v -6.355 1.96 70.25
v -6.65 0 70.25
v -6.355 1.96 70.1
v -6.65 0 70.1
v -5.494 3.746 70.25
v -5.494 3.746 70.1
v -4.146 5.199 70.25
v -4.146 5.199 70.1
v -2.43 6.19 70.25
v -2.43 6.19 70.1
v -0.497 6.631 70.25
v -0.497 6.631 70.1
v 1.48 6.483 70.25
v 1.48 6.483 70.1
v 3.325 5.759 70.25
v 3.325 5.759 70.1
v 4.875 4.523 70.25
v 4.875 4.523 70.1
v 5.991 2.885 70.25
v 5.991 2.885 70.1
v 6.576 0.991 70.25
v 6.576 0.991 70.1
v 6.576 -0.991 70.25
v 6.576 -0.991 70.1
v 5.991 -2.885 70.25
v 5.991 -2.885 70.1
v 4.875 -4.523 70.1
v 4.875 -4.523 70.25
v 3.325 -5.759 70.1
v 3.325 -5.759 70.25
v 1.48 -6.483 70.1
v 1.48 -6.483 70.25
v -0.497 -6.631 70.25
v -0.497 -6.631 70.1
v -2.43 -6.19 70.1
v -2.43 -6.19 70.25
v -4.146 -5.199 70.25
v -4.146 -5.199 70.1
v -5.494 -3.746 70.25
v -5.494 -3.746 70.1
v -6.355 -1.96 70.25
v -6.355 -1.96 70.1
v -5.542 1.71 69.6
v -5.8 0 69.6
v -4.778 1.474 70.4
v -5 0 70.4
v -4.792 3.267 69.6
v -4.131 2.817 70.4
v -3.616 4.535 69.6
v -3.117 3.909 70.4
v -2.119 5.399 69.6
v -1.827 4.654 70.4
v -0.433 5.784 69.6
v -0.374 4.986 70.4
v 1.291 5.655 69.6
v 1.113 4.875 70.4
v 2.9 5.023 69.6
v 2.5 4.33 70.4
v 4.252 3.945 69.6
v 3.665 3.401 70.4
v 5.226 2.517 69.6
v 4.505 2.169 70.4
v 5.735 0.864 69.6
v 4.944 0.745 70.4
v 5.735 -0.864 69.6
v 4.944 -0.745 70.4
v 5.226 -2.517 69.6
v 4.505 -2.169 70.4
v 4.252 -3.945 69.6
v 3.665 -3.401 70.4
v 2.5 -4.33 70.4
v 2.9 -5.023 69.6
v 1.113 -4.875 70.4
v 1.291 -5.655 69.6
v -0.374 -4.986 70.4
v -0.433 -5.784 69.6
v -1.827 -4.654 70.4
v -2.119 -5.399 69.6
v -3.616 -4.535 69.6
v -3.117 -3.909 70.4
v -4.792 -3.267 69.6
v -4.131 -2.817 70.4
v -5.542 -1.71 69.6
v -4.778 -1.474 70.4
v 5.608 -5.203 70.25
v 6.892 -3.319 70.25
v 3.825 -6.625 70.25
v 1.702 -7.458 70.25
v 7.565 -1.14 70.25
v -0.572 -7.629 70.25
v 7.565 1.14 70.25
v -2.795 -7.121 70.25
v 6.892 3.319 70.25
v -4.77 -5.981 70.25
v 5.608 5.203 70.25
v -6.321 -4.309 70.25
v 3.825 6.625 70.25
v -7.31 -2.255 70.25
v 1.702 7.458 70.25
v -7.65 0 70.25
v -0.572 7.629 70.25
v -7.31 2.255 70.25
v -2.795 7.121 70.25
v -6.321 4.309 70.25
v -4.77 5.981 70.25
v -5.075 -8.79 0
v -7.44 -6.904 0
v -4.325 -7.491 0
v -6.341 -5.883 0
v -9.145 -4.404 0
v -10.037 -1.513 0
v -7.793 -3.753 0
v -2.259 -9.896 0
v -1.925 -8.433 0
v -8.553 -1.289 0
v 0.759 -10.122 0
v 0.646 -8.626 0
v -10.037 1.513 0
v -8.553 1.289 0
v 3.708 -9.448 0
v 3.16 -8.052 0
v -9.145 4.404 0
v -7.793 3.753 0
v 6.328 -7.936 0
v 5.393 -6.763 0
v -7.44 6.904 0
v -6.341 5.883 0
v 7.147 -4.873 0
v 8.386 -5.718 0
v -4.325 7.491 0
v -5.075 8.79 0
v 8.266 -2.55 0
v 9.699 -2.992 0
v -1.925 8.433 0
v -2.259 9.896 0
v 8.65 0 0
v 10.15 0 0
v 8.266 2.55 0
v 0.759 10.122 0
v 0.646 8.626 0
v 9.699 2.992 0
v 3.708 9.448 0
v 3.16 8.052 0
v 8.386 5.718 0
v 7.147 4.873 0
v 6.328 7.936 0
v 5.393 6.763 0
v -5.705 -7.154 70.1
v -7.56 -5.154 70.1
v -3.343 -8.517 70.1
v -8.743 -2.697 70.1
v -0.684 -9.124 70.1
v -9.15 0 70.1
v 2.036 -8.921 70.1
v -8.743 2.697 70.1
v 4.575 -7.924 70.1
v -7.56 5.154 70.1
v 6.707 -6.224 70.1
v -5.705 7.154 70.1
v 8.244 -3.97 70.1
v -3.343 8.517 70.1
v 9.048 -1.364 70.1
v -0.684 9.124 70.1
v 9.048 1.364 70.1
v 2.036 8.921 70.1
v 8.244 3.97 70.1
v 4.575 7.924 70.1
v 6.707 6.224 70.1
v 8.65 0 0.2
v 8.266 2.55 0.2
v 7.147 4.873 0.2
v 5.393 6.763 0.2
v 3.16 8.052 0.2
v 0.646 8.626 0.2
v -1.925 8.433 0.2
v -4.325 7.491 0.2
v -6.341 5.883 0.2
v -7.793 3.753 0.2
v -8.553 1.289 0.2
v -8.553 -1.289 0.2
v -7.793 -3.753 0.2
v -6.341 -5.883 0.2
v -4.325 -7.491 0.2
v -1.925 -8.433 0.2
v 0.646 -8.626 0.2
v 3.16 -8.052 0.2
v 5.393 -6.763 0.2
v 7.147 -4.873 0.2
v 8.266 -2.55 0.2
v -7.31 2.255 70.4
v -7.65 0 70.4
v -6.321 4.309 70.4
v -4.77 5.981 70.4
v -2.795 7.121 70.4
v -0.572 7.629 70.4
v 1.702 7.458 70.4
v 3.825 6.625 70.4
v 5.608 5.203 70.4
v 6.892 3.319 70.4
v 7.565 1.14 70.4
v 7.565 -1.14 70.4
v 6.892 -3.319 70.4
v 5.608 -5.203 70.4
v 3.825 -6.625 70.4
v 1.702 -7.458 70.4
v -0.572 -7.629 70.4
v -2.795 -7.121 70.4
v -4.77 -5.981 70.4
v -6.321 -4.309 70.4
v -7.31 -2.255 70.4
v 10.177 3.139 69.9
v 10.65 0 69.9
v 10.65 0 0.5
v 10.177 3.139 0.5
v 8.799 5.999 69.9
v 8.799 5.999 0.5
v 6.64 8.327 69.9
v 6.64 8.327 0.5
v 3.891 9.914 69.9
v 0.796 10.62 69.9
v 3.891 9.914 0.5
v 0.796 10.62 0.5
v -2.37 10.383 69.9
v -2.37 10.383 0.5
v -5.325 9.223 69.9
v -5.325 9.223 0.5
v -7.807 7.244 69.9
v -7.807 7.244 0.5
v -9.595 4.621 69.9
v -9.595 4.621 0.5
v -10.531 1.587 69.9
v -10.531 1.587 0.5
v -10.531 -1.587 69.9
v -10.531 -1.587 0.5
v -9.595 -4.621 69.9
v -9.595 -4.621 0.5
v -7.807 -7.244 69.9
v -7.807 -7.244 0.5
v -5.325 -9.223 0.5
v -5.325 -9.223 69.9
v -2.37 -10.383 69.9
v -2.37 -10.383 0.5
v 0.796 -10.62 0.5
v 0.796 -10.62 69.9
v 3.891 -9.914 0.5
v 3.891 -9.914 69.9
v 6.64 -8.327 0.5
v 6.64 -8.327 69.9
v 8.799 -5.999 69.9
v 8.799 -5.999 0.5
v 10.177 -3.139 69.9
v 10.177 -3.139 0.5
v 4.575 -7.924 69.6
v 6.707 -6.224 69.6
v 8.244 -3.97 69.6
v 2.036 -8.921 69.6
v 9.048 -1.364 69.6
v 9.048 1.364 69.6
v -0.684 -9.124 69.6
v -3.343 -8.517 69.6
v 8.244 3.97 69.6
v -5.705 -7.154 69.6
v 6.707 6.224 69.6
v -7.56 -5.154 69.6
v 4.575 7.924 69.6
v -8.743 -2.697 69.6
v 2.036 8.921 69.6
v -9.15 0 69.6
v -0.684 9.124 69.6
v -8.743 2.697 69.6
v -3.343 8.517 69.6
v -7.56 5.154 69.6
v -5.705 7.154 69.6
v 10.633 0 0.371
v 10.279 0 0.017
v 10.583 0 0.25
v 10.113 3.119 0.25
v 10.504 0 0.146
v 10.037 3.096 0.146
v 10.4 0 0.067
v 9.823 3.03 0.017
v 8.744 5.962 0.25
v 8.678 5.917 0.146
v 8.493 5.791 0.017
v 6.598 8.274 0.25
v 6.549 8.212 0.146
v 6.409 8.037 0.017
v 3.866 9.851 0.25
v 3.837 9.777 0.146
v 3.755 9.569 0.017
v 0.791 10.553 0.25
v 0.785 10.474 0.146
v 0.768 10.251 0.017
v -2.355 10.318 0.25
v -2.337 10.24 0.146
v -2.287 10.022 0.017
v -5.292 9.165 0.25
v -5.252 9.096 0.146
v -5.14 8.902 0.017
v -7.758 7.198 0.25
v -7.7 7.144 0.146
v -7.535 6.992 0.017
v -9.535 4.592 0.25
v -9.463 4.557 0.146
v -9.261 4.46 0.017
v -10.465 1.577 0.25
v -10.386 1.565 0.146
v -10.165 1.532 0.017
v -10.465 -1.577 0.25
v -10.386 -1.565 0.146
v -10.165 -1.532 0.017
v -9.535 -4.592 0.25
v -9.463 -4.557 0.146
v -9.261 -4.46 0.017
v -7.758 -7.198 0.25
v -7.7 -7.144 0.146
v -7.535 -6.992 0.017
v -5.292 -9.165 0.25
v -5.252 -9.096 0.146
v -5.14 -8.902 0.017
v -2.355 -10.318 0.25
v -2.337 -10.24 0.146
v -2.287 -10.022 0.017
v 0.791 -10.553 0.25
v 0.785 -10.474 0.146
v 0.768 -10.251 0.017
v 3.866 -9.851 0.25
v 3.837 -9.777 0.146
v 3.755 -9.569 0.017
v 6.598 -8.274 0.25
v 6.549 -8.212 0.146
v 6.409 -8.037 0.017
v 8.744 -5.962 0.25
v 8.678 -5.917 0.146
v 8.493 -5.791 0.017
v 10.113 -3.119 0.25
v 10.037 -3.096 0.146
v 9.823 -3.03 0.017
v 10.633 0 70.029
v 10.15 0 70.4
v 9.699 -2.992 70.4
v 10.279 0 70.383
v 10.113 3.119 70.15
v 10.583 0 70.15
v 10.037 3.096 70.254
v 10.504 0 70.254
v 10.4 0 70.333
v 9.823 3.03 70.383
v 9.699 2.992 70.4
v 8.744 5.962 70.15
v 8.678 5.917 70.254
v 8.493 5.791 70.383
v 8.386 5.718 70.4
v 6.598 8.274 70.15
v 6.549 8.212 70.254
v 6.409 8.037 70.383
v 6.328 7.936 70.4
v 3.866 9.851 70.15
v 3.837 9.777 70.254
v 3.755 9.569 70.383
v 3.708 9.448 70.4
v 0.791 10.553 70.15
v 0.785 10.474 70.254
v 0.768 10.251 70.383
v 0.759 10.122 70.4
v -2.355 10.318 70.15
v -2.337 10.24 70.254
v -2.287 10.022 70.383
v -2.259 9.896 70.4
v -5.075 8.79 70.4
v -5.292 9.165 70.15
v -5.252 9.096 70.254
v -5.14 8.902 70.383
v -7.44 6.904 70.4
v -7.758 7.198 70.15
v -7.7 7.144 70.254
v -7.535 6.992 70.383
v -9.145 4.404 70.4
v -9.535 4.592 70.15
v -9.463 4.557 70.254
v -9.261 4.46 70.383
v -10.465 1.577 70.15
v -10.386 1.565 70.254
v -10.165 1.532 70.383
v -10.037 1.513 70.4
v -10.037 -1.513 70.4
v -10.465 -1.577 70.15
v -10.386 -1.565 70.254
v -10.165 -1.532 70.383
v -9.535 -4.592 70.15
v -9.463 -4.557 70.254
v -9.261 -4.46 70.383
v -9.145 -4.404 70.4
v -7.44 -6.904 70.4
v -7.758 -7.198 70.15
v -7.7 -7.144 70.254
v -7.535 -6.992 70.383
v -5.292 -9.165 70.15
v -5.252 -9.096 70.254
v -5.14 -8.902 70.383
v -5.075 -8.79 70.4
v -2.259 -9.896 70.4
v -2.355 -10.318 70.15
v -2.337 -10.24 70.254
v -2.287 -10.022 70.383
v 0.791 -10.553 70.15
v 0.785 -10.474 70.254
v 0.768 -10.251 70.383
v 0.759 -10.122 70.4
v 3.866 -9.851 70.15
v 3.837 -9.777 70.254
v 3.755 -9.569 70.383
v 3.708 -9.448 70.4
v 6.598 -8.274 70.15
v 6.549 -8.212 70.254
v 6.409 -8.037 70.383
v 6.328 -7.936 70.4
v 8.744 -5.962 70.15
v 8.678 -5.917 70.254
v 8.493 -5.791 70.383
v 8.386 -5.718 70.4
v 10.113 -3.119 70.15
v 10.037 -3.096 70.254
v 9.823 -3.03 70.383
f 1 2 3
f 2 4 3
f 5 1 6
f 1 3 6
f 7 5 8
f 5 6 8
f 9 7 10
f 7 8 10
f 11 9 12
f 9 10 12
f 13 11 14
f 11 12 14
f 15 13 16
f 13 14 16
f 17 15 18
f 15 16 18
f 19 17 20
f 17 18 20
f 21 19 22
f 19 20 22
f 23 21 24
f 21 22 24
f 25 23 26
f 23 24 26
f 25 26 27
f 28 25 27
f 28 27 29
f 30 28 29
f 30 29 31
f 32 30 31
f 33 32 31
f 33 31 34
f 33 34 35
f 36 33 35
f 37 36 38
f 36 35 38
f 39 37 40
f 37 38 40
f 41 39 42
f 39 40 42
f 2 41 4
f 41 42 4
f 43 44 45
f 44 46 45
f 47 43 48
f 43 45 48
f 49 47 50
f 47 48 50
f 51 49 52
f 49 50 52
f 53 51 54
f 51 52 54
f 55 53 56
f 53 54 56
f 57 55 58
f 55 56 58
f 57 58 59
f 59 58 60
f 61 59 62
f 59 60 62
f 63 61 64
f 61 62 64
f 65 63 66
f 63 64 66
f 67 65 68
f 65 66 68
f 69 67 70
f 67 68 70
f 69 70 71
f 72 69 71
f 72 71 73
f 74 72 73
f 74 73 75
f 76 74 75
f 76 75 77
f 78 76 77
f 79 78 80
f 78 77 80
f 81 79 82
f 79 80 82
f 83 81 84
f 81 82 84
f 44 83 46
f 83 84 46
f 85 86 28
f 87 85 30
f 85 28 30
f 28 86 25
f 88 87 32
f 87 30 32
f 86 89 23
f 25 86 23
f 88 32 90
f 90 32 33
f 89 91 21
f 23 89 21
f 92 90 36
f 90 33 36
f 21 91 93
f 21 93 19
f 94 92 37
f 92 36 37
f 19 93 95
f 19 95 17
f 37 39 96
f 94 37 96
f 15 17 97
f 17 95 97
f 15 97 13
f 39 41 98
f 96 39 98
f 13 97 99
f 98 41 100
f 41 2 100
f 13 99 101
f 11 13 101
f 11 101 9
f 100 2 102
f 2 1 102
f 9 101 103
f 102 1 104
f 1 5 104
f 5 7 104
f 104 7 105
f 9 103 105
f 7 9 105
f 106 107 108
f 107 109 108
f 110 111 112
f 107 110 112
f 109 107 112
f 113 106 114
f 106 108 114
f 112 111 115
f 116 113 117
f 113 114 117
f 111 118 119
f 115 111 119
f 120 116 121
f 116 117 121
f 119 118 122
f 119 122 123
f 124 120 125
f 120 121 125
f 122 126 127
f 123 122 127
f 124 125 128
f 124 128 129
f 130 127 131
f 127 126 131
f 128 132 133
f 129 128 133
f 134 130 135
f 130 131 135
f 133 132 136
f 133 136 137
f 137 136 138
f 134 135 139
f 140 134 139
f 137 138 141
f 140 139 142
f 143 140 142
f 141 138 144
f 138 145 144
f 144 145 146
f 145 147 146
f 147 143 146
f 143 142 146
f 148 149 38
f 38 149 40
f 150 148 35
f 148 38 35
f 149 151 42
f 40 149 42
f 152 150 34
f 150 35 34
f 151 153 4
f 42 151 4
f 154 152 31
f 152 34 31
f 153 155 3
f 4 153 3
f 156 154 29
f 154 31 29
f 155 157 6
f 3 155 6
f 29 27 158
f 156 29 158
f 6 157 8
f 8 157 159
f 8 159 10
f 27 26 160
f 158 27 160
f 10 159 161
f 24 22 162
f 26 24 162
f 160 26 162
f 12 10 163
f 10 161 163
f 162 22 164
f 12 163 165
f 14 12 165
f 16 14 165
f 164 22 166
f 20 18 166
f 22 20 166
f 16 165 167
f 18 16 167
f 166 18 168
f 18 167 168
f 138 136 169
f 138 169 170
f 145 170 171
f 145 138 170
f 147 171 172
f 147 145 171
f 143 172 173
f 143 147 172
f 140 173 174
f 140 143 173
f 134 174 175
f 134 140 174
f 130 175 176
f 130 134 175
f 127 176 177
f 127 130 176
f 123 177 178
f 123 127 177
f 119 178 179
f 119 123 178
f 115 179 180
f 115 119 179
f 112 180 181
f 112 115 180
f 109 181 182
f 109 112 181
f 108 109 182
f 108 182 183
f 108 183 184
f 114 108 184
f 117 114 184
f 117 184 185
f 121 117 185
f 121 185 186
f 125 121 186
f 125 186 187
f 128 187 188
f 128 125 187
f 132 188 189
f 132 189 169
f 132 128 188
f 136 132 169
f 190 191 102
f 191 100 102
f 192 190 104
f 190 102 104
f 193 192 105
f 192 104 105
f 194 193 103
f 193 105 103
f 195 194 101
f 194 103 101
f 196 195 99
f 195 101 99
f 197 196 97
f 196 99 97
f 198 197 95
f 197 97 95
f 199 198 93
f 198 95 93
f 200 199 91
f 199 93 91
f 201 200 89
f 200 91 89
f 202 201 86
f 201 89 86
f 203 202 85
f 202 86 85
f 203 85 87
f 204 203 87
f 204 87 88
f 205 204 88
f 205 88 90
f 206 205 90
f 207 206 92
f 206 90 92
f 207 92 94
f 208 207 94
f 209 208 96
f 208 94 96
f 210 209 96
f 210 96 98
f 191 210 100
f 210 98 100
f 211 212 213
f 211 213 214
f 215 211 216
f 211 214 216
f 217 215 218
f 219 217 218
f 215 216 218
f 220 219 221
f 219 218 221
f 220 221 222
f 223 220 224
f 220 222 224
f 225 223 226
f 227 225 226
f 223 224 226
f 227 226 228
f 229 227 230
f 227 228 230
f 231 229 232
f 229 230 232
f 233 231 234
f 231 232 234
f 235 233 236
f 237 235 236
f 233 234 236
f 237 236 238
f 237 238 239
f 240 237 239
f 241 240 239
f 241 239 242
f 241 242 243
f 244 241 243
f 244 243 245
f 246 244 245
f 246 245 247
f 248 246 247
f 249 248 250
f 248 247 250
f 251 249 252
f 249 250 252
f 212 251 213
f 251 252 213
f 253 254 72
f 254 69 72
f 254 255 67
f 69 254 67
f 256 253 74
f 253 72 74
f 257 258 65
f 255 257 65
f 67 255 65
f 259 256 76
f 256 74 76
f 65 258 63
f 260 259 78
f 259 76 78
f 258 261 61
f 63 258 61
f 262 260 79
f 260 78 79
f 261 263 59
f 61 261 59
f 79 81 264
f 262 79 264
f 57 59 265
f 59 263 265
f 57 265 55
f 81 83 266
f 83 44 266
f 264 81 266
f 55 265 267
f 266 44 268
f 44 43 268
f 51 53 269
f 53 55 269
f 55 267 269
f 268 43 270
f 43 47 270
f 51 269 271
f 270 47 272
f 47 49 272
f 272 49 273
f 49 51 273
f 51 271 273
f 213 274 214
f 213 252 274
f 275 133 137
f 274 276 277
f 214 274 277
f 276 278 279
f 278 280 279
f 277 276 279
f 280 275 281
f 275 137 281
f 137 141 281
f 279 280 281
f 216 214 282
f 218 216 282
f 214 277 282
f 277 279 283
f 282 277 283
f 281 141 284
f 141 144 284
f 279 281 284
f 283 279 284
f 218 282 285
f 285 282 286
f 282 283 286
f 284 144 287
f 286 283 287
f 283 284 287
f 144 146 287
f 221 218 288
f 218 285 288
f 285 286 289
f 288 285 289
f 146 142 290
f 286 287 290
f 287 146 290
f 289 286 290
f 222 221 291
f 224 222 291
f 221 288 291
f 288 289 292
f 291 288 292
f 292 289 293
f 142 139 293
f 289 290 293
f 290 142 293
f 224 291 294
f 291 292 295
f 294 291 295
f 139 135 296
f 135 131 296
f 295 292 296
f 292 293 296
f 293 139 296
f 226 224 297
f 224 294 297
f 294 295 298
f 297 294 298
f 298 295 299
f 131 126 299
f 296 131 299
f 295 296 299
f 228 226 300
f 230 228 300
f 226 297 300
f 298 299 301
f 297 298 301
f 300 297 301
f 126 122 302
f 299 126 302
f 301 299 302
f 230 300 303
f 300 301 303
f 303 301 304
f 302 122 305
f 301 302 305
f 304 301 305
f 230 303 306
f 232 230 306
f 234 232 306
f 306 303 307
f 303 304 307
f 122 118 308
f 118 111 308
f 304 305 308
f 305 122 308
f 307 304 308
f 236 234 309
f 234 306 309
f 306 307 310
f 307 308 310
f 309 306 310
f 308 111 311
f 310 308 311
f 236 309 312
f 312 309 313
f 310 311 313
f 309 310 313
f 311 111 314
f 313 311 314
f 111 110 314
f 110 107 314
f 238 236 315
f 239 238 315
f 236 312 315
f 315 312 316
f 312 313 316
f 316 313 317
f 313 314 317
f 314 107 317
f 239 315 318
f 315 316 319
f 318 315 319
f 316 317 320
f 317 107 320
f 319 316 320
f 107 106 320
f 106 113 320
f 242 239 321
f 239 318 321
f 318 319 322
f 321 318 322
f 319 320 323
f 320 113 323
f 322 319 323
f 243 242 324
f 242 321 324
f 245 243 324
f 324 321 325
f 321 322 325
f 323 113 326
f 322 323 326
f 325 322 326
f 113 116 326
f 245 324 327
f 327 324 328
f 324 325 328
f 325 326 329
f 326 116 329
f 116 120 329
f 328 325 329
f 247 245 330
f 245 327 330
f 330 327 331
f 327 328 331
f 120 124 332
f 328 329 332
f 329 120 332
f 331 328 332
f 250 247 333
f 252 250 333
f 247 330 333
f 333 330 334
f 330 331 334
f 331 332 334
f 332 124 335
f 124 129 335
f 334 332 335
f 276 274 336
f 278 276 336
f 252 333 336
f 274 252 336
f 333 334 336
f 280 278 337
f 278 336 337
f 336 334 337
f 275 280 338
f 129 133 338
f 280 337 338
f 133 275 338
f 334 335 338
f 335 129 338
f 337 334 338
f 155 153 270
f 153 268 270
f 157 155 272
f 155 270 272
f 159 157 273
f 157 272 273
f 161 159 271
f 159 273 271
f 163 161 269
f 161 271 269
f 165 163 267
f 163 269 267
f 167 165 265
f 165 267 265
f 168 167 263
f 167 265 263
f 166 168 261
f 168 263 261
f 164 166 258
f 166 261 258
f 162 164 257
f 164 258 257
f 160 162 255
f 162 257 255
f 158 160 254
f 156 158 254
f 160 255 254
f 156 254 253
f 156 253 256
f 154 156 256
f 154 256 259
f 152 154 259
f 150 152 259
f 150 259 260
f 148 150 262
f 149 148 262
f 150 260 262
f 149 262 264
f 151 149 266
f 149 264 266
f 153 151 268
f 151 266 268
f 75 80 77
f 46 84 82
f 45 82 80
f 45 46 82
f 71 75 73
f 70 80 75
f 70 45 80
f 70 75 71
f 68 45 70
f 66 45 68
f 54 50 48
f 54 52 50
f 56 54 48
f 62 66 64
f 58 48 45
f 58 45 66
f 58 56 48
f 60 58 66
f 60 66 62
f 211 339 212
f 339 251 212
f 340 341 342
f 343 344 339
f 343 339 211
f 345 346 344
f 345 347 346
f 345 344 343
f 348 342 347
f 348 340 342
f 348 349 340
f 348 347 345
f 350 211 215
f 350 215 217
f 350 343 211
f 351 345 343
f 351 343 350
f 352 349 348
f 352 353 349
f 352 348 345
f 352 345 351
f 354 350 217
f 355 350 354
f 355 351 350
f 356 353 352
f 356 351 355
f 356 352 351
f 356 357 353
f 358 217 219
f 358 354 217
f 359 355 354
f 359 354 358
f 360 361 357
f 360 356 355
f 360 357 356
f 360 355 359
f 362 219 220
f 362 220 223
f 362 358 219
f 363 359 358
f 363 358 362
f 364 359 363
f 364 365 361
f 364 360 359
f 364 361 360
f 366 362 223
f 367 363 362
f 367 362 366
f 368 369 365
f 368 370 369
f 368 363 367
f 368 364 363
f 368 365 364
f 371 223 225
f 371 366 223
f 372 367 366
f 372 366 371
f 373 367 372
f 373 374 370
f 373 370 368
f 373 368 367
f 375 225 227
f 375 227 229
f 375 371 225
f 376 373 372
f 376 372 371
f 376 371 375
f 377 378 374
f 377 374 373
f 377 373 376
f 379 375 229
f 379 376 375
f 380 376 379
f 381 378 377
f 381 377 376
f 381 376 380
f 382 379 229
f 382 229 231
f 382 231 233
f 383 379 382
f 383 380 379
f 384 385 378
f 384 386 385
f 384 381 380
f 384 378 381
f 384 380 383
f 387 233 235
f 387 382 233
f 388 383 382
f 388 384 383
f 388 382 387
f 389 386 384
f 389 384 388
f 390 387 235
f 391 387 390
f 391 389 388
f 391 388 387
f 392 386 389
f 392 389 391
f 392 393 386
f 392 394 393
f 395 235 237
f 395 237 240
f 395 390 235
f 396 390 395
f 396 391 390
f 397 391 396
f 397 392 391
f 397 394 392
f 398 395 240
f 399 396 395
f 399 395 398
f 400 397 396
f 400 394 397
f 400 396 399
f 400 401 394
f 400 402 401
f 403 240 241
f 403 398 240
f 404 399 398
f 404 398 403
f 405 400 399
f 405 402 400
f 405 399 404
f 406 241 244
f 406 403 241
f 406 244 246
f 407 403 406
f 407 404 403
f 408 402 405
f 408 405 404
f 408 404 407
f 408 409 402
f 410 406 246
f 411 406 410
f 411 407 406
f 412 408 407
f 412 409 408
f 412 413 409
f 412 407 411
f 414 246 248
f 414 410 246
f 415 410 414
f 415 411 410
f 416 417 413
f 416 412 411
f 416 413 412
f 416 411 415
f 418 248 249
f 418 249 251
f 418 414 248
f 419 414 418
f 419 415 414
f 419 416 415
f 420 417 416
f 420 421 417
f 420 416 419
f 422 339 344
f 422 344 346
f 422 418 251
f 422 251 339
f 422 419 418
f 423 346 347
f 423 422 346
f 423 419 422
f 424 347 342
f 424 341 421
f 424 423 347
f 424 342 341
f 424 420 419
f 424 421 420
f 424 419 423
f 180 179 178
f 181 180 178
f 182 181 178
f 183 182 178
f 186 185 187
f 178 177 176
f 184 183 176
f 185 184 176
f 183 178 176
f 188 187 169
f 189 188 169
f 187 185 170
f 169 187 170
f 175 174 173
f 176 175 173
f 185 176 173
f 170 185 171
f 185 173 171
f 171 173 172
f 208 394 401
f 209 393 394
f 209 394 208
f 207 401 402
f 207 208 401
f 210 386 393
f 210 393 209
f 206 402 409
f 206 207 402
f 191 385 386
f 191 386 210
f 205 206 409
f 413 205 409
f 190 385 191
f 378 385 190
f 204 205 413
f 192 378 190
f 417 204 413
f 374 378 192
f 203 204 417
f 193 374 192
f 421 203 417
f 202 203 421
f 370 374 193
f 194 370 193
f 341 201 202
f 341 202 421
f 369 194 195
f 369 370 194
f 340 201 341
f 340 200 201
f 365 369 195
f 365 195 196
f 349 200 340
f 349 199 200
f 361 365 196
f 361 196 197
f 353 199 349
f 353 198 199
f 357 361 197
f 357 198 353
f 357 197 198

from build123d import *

# Parameters (mm, degrees)
SKETCH1_R           = 10.65
BOSS_EXTRUDE1_DEPTH = 70.4
SKETCH2_R           = 8.65
CUT_EXTRUDE1_DEPTH  = 0.2
FILLET1_R           = 0.5


with BuildPart() as part:
    # Sketch1 → Boss-Extrude1 (new body)
    with BuildSketch(Plane.XY):
        Circle(SKETCH1_R)
    extrude(amount=BOSS_EXTRUDE1_DEPTH)

    # Sketch2 → Cut-Extrude1 (cut)
    with BuildSketch(Plane.XY):
        Circle(SKETCH2_R)
    extrude(amount=CUT_EXTRUDE1_DEPTH, mode=Mode.SUBTRACT)

    # Sketch3 → Cut-Revolve1 (revolve, cut)
    with BuildSketch(Plane(origin=(0, 0, 0), x_dir=(1, 0, 0), z_dir=(0, 1, 0))):
        Polygon((-9.149999999, -70.1), (-9.149999999, -69.600000001), (-5.799999999, -69.600000001), (-5, -70.4), (-7.650000002, -70.4), (-7.650000002, -70.25), (-6.649999999, -70.25), (-6.649999999, -70.1), align=None)
    revolve(axis=Axis((0, 0, 70.4), (0, 0, -1)), mode=Mode.SUBTRACT)

    # Fillet1
    fillet1_edges = [part.edges().sort_by_distance(p)[0] for p in [
        (-10.65, 0, 0),
        (-10.65, 0, 70.4),
    ]]
    fillet(fillet1_edges, radius=FILLET1_R)


solid = part.part
